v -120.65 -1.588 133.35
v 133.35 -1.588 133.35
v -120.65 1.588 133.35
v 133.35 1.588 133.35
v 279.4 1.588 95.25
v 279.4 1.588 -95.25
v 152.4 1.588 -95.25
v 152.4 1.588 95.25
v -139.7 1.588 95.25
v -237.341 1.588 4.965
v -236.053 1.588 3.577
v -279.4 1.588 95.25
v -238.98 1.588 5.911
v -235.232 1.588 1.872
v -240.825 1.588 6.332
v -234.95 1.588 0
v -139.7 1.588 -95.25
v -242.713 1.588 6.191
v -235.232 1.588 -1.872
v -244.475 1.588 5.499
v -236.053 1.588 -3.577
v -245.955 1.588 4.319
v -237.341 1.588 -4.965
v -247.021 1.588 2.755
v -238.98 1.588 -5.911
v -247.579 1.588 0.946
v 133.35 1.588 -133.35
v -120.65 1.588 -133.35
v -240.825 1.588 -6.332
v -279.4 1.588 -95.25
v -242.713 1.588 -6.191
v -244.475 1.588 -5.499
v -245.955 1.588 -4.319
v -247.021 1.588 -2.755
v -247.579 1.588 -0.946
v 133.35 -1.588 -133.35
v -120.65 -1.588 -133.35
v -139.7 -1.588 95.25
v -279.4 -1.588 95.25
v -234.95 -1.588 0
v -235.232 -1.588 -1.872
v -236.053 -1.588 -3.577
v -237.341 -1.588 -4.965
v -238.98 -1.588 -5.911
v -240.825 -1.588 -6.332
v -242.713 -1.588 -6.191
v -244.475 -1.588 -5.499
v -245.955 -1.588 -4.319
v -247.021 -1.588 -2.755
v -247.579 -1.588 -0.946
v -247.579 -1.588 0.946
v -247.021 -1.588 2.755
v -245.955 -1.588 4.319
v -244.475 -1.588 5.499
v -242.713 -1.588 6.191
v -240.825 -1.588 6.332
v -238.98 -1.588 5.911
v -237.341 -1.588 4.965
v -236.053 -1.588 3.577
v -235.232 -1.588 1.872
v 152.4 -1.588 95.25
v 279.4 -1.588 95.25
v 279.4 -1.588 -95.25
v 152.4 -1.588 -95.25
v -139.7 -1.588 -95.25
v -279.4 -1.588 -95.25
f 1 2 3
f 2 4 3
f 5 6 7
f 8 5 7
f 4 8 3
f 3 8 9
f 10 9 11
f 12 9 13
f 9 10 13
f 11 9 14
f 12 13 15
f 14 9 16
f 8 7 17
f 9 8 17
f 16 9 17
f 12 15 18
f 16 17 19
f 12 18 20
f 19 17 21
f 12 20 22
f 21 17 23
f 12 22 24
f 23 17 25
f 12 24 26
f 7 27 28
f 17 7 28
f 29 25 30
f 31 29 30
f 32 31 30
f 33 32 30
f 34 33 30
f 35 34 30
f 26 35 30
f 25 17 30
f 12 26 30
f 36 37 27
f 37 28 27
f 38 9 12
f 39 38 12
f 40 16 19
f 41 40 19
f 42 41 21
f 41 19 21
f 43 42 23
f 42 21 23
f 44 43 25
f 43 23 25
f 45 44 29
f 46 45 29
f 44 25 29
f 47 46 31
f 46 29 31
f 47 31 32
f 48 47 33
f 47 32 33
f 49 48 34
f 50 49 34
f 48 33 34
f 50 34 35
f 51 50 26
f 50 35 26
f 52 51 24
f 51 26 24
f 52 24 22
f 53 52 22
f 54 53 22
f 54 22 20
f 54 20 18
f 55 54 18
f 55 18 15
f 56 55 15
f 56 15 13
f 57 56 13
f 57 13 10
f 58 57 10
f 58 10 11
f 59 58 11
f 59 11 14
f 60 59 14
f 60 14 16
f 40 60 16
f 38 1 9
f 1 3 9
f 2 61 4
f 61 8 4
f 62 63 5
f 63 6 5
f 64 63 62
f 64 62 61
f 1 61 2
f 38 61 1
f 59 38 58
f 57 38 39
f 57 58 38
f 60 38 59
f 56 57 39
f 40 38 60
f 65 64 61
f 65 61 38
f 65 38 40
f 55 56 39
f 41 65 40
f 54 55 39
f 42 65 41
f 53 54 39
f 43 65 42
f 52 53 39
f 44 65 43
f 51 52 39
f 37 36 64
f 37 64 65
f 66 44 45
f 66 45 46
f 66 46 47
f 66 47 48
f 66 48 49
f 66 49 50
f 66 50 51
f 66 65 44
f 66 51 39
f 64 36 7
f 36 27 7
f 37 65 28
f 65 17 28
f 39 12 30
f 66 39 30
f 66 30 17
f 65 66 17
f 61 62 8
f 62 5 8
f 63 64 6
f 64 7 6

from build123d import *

# Parameters (mm, degrees)
BOSS_EXTRUDE1_DEPTH = 1.5875
SKETCH8_R           = 6.35
CUT_EXTRUDE1_DEPTH  = 5.08


with BuildPart() as part:
    # Sketch3 → Boss-Extrude1 (new body, symmetric)
    with BuildSketch(Plane(origin=(0, 0, 0), x_dir=(1, 0, 0), z_dir=(0, 1, 0))):
        Polygon((-279.4, 95.25), (-139.7, 95.25), (-120.65, 133.35), (133.35, 133.35), (152.4, 95.25), (279.4, 95.25), (279.4, -95.25), (152.4, -95.25), (133.35, -133.35), (-120.65, -133.35), (-139.7, -95.25), (-279.4, -95.25), align=None)
    extrude(amount=BOSS_EXTRUDE1_DEPTH, both=True)

    # Sketch8 → Cut-Extrude1 (cut)
    with BuildSketch(Plane(origin=(0, 1.5875, 0), x_dir=(1, 0, 0), z_dir=(0, 1, 0))):
        with Locations((-241.3, 0)):
            Circle(SKETCH8_R)
    extrude(amount=-CUT_EXTRUDE1_DEPTH, mode=Mode.SUBTRACT)


solid = part.part
